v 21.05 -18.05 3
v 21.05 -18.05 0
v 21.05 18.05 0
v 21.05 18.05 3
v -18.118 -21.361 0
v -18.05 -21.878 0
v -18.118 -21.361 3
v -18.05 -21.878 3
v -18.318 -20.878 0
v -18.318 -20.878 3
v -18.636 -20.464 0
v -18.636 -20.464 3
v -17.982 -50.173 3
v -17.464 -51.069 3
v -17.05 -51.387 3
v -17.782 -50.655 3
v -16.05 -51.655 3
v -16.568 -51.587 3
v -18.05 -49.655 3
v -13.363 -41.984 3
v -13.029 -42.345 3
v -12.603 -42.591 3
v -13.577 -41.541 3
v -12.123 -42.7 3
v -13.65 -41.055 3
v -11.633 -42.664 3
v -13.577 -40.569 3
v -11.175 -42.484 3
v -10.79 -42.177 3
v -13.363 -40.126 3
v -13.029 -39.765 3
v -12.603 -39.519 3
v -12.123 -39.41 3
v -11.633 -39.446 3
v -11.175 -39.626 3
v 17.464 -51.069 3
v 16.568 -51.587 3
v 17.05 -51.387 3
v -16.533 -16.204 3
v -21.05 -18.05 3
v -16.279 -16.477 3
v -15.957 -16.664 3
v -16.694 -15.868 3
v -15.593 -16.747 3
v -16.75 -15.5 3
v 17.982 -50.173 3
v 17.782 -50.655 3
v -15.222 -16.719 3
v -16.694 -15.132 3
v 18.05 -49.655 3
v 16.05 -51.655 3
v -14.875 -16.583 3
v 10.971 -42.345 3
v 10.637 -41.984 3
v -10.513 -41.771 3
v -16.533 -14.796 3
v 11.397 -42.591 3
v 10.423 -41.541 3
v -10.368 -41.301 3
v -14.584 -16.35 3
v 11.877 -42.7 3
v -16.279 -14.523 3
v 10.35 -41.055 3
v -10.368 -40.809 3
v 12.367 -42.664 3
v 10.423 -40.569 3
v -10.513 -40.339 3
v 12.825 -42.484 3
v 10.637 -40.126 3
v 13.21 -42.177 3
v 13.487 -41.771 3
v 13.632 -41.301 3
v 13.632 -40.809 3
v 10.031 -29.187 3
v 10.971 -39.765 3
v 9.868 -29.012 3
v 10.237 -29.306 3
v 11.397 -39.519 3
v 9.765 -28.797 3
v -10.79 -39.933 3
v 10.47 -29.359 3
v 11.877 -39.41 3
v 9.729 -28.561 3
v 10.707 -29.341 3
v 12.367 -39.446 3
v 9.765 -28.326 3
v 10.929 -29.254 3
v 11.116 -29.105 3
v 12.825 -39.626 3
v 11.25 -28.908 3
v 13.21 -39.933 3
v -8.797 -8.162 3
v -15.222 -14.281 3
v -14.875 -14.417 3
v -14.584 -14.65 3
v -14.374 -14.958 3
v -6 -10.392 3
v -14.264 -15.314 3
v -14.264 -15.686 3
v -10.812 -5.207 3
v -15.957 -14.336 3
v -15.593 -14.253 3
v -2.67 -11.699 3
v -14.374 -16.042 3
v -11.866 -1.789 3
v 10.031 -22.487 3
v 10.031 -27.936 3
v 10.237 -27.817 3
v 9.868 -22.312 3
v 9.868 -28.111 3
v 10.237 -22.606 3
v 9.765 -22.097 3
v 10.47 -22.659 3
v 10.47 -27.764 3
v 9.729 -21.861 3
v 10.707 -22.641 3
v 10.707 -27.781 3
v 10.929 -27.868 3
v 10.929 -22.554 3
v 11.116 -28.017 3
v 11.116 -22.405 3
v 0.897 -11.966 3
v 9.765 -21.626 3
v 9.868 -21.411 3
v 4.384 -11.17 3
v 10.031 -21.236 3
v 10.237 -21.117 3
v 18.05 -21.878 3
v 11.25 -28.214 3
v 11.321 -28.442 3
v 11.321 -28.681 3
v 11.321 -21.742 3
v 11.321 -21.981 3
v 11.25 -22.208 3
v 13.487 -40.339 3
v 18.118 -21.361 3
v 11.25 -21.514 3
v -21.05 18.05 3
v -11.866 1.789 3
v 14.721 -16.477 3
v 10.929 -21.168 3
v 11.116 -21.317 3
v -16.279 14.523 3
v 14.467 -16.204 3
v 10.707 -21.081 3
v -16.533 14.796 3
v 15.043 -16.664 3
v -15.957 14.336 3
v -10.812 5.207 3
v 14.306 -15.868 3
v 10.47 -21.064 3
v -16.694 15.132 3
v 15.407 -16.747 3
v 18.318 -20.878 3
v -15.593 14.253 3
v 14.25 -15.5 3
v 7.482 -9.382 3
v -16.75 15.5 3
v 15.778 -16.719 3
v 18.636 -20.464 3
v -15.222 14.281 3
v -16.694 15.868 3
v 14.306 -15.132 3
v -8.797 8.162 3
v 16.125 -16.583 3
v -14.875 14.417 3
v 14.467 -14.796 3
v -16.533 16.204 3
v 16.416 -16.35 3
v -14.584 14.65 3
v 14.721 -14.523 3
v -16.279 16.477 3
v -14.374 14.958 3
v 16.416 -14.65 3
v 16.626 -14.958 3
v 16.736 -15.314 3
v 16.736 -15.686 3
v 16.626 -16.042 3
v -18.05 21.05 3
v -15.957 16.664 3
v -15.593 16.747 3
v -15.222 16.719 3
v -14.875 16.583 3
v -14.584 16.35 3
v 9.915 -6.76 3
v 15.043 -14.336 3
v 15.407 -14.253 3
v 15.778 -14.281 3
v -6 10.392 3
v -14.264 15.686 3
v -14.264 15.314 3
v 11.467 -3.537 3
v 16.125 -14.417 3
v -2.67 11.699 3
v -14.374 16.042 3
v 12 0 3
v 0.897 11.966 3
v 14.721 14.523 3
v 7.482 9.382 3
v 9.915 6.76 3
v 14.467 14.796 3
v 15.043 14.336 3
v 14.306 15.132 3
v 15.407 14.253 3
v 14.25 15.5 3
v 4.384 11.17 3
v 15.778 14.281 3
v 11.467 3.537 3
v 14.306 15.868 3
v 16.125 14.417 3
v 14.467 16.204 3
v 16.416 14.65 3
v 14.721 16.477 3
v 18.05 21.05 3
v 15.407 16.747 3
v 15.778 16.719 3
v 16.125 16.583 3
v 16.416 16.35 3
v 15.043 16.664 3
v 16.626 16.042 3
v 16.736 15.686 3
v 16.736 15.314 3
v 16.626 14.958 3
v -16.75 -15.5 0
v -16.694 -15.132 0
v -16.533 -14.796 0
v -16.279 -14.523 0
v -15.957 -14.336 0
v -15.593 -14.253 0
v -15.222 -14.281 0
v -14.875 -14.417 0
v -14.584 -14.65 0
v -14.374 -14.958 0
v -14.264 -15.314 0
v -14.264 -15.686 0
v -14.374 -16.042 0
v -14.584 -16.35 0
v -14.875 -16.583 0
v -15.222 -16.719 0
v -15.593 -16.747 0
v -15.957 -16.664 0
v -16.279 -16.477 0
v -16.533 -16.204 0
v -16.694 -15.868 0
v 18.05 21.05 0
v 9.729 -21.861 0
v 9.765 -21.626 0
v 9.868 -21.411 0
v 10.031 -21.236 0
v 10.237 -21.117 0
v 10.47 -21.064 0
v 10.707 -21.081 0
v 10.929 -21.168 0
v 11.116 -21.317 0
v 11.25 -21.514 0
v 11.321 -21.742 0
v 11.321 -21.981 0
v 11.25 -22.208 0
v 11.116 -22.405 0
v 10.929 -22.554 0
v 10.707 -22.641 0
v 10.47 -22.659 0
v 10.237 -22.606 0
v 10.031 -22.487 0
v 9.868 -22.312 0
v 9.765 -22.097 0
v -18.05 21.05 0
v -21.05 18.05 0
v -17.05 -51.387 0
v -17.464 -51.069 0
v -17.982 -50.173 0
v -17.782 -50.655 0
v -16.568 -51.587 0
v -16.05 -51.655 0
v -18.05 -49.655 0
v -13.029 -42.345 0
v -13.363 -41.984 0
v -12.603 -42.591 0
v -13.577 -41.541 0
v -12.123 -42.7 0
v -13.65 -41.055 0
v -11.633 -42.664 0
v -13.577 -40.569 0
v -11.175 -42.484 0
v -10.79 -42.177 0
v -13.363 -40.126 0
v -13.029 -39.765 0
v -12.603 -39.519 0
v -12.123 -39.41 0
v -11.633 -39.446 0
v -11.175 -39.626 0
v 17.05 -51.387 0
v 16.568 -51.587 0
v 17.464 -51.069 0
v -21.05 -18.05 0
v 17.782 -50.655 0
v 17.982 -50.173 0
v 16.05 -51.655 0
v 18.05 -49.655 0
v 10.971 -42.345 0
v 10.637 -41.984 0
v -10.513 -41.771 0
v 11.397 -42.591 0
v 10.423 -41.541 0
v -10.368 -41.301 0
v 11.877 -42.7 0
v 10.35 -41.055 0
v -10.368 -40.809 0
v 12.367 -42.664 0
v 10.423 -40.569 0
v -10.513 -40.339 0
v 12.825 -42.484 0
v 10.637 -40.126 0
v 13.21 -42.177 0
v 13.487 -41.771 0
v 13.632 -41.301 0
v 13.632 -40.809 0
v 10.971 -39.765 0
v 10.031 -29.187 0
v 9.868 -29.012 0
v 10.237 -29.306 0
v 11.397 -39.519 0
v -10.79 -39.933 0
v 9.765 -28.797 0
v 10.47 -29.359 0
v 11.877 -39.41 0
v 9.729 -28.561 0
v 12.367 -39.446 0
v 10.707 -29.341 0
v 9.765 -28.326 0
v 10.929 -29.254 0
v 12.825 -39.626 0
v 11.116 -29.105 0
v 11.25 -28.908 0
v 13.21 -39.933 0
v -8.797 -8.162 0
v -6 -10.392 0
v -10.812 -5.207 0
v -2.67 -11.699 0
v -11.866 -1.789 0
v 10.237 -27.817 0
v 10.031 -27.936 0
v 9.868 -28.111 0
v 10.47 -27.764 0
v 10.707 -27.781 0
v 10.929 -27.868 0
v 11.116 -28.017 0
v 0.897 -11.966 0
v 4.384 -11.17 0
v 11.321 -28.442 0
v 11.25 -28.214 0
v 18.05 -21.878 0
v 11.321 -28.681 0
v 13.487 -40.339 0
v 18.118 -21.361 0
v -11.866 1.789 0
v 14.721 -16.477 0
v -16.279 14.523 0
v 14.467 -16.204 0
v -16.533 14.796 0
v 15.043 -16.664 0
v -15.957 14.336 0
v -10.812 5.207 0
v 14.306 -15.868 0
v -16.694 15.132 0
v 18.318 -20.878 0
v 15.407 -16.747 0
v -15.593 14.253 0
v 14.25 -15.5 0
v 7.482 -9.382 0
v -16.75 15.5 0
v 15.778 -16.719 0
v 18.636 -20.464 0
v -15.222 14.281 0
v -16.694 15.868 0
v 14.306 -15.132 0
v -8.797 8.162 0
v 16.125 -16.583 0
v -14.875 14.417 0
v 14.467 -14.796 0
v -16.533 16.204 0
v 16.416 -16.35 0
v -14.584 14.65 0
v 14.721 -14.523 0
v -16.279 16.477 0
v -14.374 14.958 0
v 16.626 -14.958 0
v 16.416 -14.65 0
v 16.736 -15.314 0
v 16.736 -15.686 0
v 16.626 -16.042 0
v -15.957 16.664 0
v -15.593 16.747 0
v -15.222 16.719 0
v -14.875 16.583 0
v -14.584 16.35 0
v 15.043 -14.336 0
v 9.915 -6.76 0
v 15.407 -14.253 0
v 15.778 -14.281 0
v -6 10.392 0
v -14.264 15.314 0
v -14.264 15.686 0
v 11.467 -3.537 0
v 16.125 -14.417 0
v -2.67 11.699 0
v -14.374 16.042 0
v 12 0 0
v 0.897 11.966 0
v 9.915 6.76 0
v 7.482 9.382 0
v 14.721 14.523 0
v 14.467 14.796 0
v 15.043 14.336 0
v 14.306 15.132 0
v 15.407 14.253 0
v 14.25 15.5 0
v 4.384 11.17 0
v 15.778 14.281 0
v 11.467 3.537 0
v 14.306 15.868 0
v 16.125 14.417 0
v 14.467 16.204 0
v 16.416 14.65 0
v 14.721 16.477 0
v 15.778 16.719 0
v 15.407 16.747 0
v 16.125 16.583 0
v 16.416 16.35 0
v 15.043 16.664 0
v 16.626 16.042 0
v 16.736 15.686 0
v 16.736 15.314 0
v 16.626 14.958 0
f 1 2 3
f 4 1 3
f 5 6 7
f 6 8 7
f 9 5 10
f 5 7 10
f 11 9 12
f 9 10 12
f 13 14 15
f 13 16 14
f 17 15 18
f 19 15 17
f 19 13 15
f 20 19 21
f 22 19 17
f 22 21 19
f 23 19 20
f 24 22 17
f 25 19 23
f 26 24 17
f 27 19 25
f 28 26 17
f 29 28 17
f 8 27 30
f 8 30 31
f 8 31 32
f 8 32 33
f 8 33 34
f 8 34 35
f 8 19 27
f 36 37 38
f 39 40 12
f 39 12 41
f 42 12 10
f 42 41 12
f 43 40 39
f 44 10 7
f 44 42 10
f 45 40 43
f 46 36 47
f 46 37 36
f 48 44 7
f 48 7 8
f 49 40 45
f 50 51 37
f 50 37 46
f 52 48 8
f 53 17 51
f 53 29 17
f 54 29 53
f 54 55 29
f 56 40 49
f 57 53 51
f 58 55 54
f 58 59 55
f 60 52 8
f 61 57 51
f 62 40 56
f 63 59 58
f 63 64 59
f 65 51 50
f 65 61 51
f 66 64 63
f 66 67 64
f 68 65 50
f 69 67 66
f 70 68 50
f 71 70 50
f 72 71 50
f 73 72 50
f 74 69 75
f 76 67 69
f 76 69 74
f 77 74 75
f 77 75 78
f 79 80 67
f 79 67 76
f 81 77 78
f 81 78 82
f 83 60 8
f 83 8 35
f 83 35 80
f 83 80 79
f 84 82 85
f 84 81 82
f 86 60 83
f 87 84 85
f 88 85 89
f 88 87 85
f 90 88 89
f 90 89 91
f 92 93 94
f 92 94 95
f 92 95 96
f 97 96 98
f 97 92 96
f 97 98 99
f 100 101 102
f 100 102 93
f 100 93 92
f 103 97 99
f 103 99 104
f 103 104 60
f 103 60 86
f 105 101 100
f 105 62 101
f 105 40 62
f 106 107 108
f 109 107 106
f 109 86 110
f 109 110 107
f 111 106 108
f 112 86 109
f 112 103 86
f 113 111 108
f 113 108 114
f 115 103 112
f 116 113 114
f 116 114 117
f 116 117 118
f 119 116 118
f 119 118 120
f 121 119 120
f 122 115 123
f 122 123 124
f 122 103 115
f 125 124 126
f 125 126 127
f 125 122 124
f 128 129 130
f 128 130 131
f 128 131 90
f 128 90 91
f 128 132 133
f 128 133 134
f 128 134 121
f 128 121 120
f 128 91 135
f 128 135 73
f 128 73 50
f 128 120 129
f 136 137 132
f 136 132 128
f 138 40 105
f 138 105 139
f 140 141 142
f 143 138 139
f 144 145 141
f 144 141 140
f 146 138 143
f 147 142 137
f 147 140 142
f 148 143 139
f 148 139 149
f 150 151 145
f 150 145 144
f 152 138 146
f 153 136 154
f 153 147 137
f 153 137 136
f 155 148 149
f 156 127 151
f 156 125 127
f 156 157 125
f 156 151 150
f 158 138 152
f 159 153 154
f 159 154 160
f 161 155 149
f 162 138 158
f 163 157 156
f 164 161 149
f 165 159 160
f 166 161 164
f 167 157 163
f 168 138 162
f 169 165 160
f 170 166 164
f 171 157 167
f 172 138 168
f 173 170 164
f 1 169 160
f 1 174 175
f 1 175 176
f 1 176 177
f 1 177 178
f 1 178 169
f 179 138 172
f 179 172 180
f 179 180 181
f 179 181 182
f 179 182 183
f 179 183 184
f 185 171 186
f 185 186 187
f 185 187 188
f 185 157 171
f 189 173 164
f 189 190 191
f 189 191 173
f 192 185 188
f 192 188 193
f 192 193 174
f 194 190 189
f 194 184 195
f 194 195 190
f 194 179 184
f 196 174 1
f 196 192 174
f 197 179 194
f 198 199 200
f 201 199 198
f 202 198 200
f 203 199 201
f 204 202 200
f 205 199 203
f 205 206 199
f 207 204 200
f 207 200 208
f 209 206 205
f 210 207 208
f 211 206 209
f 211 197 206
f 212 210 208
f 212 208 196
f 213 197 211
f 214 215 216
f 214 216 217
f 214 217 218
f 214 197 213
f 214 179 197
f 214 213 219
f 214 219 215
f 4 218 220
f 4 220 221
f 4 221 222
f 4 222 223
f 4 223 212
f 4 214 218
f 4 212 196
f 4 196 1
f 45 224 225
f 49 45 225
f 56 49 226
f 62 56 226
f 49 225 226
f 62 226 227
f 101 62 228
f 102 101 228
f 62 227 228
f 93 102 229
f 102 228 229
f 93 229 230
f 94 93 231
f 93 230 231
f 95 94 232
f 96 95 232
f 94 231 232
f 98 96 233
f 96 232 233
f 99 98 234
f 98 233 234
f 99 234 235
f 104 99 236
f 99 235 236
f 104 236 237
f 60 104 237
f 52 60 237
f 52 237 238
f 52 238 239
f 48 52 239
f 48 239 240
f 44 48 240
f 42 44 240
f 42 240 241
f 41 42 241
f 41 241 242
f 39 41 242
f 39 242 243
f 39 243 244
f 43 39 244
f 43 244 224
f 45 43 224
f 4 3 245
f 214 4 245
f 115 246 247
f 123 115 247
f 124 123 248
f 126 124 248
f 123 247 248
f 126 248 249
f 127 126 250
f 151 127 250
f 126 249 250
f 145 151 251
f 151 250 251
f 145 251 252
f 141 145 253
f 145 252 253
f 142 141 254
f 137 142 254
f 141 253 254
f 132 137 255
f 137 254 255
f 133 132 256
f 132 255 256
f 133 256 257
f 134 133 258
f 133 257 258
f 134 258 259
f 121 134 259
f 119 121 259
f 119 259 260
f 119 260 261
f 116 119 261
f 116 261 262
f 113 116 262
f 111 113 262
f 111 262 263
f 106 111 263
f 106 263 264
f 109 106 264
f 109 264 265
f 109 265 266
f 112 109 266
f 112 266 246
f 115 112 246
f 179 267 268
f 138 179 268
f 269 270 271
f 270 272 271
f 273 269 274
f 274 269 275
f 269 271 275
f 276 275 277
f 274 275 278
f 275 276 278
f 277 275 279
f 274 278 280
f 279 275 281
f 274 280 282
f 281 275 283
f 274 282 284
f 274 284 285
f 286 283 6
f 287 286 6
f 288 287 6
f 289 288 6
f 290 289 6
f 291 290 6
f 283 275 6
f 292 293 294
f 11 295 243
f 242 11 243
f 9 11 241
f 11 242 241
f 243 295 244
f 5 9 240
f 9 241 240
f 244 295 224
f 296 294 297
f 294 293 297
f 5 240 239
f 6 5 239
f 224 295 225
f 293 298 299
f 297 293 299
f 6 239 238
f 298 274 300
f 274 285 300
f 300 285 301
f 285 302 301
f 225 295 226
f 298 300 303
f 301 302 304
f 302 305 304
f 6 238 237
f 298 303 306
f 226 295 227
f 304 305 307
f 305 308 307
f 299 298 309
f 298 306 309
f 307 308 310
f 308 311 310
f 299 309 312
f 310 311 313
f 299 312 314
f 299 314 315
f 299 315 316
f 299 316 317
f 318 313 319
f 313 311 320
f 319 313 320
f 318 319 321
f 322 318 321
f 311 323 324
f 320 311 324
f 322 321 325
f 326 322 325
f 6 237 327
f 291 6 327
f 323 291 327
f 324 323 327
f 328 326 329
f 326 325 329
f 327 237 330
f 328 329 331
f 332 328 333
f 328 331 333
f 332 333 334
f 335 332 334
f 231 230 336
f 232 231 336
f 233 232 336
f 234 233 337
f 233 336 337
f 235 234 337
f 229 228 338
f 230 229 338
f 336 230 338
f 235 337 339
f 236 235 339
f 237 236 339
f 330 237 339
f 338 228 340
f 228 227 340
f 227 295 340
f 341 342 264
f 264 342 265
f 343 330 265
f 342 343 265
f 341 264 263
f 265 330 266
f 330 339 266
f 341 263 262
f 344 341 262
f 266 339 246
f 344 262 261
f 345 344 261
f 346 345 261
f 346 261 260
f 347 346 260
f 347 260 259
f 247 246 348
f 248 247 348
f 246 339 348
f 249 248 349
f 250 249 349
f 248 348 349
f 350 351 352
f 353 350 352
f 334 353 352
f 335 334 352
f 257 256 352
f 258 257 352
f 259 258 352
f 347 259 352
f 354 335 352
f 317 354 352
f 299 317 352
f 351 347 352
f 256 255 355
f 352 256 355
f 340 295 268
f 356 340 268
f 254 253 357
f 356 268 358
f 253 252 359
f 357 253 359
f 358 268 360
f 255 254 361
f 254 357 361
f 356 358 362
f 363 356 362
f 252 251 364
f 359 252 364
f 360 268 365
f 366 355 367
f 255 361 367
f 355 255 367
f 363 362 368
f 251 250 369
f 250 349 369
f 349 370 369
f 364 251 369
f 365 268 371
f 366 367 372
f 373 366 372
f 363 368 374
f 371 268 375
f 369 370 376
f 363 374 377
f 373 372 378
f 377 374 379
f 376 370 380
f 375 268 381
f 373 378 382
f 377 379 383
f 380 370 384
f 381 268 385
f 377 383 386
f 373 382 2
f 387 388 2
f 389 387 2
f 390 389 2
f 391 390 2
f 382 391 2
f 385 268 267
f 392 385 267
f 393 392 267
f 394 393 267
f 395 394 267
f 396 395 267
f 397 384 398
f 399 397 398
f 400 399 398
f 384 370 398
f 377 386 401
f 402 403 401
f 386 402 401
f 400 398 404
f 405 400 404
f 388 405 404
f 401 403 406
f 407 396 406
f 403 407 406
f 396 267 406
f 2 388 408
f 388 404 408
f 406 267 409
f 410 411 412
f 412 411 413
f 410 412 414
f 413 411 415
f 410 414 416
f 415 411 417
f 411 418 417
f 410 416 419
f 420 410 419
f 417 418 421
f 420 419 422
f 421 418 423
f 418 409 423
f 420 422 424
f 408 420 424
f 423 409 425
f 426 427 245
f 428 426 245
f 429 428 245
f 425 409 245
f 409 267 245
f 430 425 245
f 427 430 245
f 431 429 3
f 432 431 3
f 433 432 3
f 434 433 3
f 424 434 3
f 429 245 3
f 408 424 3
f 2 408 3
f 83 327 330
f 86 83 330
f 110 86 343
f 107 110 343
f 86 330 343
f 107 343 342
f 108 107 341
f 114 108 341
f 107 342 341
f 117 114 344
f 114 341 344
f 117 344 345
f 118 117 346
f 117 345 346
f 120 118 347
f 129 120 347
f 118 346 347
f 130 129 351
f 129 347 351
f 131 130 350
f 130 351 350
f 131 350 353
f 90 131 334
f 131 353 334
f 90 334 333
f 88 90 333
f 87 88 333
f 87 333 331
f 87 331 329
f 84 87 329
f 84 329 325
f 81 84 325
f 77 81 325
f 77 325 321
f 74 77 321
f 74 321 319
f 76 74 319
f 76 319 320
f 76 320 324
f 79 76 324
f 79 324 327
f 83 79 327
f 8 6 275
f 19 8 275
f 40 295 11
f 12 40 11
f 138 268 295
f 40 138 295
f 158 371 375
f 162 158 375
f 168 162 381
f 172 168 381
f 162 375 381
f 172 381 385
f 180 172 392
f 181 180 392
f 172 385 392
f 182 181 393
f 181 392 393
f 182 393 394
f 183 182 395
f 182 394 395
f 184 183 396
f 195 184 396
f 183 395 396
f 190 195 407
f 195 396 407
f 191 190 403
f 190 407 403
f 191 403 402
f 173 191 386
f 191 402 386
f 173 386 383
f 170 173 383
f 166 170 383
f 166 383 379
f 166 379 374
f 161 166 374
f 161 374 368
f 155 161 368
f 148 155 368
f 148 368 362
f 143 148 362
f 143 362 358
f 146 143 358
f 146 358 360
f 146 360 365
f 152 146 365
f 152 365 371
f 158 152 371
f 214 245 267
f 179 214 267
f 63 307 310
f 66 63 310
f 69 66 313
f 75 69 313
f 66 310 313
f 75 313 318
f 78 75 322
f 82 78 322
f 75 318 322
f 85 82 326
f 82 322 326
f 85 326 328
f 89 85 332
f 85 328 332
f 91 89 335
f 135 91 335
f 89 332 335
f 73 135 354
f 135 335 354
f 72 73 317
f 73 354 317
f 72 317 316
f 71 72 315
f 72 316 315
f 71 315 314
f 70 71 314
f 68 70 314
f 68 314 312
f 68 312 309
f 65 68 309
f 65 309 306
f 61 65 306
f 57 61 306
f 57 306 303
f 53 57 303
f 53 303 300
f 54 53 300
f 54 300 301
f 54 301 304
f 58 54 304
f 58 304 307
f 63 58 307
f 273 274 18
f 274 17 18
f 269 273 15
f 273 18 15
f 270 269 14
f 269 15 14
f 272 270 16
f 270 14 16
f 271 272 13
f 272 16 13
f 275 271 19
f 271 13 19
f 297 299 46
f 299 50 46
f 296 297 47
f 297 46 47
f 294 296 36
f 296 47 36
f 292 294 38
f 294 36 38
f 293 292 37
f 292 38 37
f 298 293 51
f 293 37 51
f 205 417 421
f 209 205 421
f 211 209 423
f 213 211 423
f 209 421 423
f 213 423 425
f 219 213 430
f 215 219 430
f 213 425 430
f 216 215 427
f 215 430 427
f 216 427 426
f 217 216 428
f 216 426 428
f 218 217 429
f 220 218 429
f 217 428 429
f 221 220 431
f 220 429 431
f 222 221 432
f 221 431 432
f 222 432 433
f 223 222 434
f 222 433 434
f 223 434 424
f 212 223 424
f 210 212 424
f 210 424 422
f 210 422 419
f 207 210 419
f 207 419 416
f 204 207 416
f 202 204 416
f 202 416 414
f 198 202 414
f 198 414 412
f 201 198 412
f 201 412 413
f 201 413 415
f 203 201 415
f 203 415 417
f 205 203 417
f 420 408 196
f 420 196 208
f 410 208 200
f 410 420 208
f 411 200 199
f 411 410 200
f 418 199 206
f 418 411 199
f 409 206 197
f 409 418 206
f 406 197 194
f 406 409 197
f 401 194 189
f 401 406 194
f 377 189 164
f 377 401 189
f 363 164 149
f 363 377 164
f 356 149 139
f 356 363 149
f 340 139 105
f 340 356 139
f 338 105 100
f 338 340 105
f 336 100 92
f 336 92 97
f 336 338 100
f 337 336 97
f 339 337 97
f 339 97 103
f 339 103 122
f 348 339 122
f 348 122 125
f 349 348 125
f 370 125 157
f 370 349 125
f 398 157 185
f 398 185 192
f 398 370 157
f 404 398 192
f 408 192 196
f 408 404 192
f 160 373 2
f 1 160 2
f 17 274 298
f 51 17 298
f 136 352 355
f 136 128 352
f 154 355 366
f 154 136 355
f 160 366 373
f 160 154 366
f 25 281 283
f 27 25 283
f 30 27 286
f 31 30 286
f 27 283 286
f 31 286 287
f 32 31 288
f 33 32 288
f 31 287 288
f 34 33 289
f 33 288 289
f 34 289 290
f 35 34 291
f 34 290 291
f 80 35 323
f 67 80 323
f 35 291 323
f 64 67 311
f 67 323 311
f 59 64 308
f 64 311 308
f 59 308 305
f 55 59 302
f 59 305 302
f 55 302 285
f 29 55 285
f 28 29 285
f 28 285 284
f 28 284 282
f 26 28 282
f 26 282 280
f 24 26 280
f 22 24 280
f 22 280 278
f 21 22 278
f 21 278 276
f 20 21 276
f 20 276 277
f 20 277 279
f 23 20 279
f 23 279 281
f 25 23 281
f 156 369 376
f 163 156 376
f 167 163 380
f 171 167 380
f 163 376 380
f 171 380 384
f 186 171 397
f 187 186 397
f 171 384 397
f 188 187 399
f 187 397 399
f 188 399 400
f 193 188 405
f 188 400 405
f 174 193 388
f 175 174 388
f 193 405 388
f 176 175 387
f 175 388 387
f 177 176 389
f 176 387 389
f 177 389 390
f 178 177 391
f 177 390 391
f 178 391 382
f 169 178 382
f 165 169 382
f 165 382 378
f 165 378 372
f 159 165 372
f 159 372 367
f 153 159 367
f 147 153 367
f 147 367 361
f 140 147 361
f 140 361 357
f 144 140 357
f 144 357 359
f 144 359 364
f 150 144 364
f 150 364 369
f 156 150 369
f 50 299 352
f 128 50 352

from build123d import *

# Parameters (mm, degrees)
SKETCH1_R                   = 12
BOSS_EXTRUDE1_DEPTH         = 3
TAP_DRILL_FOR_M3_TAP1_D     = 2.5
TAP_DRILL_FOR_M3_TAP1_DEPTH = 5
TAP_DRILL_FOR_M3_TAP1_TIP   = 0.751075774
TAP_DRILL_FOR_M4_TAP1_D     = 3.3
TAP_DRILL_FOR_M4_TAP1_DEPTH = 5
TAP_DRILL_FOR_M4_TAP1_TIP   = 0.991420021
FILLET1_R                   = 2
TAP_DRILL_FOR_M2_TAP1_D     = 1.6
TAP_DRILL_FOR_M2_TAP1_DEPTH = 5
TAP_DRILL_FOR_M2_TAP1_TIP   = 0.480688495


with BuildPart() as part:
    # Sketch1 → Boss-Extrude1 (new body)
    with BuildSketch(Plane.XY):
        Polygon((18.05, -51.655), (18.05, -21.05), (21.05, -18.05), (21.05, 18.05), (18.05, 21.05), (-18.05, 21.05), (-21.05, 18.05), (-21.05, -18.05), (-18.05, -21.05), (-18.05, -51.655), align=None)
        Circle(SKETCH1_R, mode=Mode.SUBTRACT)
    extrude(amount=BOSS_EXTRUDE1_DEPTH)

    # Tap Drill for M3 Tap1
    with Locations(Plane.XY.offset(3)):
        with Locations((-15.5, 15.5), (15.5, 15.5), (-15.5, -15.5), (15.5, -15.5)):
            Hole(TAP_DRILL_FOR_M3_TAP1_D / 2, depth=TAP_DRILL_FOR_M3_TAP1_DEPTH)
            with Locations((0, 0, -(TAP_DRILL_FOR_M3_TAP1_DEPTH + TAP_DRILL_FOR_M3_TAP1_TIP / 2))):  # 118° drill point
                Cone(0, TAP_DRILL_FOR_M3_TAP1_D / 2, TAP_DRILL_FOR_M3_TAP1_TIP, mode=Mode.SUBTRACT)

    # Tap Drill for M4 Tap1
    with Locations(Plane.XY.offset(3)):
        with Locations((-12, -41.055), (12, -41.055)):
            Hole(TAP_DRILL_FOR_M4_TAP1_D / 2, depth=TAP_DRILL_FOR_M4_TAP1_DEPTH)
            with Locations((0, 0, -(TAP_DRILL_FOR_M4_TAP1_DEPTH + TAP_DRILL_FOR_M4_TAP1_TIP / 2))):  # 118° drill point
                Cone(0, TAP_DRILL_FOR_M4_TAP1_D / 2, TAP_DRILL_FOR_M4_TAP1_TIP, mode=Mode.SUBTRACT)

    # Fillet1
    fillet1_edges = [part.edges().sort_by_distance(p)[0] for p in [
        (18.05, -21.05, 1.5),
        (18.05, -51.655, 1.5),
        (-18.05, -51.655, 1.5),
        (-18.05, -21.05, 1.5),
    ]]
    fillet(fillet1_edges, radius=FILLET1_R)

    # Tap Drill for M2 Tap1
    with Locations(Plane.XY.offset(3)):
        with Locations((10.52945603, -21.86131015), (10.52945603, -28.56131015)):
            Hole(TAP_DRILL_FOR_M2_TAP1_D / 2, depth=TAP_DRILL_FOR_M2_TAP1_DEPTH)
            with Locations((0, 0, -(TAP_DRILL_FOR_M2_TAP1_DEPTH + TAP_DRILL_FOR_M2_TAP1_TIP / 2))):  # 118° drill point
                Cone(0, TAP_DRILL_FOR_M2_TAP1_D / 2, TAP_DRILL_FOR_M2_TAP1_TIP, mode=Mode.SUBTRACT)


solid = part.part
